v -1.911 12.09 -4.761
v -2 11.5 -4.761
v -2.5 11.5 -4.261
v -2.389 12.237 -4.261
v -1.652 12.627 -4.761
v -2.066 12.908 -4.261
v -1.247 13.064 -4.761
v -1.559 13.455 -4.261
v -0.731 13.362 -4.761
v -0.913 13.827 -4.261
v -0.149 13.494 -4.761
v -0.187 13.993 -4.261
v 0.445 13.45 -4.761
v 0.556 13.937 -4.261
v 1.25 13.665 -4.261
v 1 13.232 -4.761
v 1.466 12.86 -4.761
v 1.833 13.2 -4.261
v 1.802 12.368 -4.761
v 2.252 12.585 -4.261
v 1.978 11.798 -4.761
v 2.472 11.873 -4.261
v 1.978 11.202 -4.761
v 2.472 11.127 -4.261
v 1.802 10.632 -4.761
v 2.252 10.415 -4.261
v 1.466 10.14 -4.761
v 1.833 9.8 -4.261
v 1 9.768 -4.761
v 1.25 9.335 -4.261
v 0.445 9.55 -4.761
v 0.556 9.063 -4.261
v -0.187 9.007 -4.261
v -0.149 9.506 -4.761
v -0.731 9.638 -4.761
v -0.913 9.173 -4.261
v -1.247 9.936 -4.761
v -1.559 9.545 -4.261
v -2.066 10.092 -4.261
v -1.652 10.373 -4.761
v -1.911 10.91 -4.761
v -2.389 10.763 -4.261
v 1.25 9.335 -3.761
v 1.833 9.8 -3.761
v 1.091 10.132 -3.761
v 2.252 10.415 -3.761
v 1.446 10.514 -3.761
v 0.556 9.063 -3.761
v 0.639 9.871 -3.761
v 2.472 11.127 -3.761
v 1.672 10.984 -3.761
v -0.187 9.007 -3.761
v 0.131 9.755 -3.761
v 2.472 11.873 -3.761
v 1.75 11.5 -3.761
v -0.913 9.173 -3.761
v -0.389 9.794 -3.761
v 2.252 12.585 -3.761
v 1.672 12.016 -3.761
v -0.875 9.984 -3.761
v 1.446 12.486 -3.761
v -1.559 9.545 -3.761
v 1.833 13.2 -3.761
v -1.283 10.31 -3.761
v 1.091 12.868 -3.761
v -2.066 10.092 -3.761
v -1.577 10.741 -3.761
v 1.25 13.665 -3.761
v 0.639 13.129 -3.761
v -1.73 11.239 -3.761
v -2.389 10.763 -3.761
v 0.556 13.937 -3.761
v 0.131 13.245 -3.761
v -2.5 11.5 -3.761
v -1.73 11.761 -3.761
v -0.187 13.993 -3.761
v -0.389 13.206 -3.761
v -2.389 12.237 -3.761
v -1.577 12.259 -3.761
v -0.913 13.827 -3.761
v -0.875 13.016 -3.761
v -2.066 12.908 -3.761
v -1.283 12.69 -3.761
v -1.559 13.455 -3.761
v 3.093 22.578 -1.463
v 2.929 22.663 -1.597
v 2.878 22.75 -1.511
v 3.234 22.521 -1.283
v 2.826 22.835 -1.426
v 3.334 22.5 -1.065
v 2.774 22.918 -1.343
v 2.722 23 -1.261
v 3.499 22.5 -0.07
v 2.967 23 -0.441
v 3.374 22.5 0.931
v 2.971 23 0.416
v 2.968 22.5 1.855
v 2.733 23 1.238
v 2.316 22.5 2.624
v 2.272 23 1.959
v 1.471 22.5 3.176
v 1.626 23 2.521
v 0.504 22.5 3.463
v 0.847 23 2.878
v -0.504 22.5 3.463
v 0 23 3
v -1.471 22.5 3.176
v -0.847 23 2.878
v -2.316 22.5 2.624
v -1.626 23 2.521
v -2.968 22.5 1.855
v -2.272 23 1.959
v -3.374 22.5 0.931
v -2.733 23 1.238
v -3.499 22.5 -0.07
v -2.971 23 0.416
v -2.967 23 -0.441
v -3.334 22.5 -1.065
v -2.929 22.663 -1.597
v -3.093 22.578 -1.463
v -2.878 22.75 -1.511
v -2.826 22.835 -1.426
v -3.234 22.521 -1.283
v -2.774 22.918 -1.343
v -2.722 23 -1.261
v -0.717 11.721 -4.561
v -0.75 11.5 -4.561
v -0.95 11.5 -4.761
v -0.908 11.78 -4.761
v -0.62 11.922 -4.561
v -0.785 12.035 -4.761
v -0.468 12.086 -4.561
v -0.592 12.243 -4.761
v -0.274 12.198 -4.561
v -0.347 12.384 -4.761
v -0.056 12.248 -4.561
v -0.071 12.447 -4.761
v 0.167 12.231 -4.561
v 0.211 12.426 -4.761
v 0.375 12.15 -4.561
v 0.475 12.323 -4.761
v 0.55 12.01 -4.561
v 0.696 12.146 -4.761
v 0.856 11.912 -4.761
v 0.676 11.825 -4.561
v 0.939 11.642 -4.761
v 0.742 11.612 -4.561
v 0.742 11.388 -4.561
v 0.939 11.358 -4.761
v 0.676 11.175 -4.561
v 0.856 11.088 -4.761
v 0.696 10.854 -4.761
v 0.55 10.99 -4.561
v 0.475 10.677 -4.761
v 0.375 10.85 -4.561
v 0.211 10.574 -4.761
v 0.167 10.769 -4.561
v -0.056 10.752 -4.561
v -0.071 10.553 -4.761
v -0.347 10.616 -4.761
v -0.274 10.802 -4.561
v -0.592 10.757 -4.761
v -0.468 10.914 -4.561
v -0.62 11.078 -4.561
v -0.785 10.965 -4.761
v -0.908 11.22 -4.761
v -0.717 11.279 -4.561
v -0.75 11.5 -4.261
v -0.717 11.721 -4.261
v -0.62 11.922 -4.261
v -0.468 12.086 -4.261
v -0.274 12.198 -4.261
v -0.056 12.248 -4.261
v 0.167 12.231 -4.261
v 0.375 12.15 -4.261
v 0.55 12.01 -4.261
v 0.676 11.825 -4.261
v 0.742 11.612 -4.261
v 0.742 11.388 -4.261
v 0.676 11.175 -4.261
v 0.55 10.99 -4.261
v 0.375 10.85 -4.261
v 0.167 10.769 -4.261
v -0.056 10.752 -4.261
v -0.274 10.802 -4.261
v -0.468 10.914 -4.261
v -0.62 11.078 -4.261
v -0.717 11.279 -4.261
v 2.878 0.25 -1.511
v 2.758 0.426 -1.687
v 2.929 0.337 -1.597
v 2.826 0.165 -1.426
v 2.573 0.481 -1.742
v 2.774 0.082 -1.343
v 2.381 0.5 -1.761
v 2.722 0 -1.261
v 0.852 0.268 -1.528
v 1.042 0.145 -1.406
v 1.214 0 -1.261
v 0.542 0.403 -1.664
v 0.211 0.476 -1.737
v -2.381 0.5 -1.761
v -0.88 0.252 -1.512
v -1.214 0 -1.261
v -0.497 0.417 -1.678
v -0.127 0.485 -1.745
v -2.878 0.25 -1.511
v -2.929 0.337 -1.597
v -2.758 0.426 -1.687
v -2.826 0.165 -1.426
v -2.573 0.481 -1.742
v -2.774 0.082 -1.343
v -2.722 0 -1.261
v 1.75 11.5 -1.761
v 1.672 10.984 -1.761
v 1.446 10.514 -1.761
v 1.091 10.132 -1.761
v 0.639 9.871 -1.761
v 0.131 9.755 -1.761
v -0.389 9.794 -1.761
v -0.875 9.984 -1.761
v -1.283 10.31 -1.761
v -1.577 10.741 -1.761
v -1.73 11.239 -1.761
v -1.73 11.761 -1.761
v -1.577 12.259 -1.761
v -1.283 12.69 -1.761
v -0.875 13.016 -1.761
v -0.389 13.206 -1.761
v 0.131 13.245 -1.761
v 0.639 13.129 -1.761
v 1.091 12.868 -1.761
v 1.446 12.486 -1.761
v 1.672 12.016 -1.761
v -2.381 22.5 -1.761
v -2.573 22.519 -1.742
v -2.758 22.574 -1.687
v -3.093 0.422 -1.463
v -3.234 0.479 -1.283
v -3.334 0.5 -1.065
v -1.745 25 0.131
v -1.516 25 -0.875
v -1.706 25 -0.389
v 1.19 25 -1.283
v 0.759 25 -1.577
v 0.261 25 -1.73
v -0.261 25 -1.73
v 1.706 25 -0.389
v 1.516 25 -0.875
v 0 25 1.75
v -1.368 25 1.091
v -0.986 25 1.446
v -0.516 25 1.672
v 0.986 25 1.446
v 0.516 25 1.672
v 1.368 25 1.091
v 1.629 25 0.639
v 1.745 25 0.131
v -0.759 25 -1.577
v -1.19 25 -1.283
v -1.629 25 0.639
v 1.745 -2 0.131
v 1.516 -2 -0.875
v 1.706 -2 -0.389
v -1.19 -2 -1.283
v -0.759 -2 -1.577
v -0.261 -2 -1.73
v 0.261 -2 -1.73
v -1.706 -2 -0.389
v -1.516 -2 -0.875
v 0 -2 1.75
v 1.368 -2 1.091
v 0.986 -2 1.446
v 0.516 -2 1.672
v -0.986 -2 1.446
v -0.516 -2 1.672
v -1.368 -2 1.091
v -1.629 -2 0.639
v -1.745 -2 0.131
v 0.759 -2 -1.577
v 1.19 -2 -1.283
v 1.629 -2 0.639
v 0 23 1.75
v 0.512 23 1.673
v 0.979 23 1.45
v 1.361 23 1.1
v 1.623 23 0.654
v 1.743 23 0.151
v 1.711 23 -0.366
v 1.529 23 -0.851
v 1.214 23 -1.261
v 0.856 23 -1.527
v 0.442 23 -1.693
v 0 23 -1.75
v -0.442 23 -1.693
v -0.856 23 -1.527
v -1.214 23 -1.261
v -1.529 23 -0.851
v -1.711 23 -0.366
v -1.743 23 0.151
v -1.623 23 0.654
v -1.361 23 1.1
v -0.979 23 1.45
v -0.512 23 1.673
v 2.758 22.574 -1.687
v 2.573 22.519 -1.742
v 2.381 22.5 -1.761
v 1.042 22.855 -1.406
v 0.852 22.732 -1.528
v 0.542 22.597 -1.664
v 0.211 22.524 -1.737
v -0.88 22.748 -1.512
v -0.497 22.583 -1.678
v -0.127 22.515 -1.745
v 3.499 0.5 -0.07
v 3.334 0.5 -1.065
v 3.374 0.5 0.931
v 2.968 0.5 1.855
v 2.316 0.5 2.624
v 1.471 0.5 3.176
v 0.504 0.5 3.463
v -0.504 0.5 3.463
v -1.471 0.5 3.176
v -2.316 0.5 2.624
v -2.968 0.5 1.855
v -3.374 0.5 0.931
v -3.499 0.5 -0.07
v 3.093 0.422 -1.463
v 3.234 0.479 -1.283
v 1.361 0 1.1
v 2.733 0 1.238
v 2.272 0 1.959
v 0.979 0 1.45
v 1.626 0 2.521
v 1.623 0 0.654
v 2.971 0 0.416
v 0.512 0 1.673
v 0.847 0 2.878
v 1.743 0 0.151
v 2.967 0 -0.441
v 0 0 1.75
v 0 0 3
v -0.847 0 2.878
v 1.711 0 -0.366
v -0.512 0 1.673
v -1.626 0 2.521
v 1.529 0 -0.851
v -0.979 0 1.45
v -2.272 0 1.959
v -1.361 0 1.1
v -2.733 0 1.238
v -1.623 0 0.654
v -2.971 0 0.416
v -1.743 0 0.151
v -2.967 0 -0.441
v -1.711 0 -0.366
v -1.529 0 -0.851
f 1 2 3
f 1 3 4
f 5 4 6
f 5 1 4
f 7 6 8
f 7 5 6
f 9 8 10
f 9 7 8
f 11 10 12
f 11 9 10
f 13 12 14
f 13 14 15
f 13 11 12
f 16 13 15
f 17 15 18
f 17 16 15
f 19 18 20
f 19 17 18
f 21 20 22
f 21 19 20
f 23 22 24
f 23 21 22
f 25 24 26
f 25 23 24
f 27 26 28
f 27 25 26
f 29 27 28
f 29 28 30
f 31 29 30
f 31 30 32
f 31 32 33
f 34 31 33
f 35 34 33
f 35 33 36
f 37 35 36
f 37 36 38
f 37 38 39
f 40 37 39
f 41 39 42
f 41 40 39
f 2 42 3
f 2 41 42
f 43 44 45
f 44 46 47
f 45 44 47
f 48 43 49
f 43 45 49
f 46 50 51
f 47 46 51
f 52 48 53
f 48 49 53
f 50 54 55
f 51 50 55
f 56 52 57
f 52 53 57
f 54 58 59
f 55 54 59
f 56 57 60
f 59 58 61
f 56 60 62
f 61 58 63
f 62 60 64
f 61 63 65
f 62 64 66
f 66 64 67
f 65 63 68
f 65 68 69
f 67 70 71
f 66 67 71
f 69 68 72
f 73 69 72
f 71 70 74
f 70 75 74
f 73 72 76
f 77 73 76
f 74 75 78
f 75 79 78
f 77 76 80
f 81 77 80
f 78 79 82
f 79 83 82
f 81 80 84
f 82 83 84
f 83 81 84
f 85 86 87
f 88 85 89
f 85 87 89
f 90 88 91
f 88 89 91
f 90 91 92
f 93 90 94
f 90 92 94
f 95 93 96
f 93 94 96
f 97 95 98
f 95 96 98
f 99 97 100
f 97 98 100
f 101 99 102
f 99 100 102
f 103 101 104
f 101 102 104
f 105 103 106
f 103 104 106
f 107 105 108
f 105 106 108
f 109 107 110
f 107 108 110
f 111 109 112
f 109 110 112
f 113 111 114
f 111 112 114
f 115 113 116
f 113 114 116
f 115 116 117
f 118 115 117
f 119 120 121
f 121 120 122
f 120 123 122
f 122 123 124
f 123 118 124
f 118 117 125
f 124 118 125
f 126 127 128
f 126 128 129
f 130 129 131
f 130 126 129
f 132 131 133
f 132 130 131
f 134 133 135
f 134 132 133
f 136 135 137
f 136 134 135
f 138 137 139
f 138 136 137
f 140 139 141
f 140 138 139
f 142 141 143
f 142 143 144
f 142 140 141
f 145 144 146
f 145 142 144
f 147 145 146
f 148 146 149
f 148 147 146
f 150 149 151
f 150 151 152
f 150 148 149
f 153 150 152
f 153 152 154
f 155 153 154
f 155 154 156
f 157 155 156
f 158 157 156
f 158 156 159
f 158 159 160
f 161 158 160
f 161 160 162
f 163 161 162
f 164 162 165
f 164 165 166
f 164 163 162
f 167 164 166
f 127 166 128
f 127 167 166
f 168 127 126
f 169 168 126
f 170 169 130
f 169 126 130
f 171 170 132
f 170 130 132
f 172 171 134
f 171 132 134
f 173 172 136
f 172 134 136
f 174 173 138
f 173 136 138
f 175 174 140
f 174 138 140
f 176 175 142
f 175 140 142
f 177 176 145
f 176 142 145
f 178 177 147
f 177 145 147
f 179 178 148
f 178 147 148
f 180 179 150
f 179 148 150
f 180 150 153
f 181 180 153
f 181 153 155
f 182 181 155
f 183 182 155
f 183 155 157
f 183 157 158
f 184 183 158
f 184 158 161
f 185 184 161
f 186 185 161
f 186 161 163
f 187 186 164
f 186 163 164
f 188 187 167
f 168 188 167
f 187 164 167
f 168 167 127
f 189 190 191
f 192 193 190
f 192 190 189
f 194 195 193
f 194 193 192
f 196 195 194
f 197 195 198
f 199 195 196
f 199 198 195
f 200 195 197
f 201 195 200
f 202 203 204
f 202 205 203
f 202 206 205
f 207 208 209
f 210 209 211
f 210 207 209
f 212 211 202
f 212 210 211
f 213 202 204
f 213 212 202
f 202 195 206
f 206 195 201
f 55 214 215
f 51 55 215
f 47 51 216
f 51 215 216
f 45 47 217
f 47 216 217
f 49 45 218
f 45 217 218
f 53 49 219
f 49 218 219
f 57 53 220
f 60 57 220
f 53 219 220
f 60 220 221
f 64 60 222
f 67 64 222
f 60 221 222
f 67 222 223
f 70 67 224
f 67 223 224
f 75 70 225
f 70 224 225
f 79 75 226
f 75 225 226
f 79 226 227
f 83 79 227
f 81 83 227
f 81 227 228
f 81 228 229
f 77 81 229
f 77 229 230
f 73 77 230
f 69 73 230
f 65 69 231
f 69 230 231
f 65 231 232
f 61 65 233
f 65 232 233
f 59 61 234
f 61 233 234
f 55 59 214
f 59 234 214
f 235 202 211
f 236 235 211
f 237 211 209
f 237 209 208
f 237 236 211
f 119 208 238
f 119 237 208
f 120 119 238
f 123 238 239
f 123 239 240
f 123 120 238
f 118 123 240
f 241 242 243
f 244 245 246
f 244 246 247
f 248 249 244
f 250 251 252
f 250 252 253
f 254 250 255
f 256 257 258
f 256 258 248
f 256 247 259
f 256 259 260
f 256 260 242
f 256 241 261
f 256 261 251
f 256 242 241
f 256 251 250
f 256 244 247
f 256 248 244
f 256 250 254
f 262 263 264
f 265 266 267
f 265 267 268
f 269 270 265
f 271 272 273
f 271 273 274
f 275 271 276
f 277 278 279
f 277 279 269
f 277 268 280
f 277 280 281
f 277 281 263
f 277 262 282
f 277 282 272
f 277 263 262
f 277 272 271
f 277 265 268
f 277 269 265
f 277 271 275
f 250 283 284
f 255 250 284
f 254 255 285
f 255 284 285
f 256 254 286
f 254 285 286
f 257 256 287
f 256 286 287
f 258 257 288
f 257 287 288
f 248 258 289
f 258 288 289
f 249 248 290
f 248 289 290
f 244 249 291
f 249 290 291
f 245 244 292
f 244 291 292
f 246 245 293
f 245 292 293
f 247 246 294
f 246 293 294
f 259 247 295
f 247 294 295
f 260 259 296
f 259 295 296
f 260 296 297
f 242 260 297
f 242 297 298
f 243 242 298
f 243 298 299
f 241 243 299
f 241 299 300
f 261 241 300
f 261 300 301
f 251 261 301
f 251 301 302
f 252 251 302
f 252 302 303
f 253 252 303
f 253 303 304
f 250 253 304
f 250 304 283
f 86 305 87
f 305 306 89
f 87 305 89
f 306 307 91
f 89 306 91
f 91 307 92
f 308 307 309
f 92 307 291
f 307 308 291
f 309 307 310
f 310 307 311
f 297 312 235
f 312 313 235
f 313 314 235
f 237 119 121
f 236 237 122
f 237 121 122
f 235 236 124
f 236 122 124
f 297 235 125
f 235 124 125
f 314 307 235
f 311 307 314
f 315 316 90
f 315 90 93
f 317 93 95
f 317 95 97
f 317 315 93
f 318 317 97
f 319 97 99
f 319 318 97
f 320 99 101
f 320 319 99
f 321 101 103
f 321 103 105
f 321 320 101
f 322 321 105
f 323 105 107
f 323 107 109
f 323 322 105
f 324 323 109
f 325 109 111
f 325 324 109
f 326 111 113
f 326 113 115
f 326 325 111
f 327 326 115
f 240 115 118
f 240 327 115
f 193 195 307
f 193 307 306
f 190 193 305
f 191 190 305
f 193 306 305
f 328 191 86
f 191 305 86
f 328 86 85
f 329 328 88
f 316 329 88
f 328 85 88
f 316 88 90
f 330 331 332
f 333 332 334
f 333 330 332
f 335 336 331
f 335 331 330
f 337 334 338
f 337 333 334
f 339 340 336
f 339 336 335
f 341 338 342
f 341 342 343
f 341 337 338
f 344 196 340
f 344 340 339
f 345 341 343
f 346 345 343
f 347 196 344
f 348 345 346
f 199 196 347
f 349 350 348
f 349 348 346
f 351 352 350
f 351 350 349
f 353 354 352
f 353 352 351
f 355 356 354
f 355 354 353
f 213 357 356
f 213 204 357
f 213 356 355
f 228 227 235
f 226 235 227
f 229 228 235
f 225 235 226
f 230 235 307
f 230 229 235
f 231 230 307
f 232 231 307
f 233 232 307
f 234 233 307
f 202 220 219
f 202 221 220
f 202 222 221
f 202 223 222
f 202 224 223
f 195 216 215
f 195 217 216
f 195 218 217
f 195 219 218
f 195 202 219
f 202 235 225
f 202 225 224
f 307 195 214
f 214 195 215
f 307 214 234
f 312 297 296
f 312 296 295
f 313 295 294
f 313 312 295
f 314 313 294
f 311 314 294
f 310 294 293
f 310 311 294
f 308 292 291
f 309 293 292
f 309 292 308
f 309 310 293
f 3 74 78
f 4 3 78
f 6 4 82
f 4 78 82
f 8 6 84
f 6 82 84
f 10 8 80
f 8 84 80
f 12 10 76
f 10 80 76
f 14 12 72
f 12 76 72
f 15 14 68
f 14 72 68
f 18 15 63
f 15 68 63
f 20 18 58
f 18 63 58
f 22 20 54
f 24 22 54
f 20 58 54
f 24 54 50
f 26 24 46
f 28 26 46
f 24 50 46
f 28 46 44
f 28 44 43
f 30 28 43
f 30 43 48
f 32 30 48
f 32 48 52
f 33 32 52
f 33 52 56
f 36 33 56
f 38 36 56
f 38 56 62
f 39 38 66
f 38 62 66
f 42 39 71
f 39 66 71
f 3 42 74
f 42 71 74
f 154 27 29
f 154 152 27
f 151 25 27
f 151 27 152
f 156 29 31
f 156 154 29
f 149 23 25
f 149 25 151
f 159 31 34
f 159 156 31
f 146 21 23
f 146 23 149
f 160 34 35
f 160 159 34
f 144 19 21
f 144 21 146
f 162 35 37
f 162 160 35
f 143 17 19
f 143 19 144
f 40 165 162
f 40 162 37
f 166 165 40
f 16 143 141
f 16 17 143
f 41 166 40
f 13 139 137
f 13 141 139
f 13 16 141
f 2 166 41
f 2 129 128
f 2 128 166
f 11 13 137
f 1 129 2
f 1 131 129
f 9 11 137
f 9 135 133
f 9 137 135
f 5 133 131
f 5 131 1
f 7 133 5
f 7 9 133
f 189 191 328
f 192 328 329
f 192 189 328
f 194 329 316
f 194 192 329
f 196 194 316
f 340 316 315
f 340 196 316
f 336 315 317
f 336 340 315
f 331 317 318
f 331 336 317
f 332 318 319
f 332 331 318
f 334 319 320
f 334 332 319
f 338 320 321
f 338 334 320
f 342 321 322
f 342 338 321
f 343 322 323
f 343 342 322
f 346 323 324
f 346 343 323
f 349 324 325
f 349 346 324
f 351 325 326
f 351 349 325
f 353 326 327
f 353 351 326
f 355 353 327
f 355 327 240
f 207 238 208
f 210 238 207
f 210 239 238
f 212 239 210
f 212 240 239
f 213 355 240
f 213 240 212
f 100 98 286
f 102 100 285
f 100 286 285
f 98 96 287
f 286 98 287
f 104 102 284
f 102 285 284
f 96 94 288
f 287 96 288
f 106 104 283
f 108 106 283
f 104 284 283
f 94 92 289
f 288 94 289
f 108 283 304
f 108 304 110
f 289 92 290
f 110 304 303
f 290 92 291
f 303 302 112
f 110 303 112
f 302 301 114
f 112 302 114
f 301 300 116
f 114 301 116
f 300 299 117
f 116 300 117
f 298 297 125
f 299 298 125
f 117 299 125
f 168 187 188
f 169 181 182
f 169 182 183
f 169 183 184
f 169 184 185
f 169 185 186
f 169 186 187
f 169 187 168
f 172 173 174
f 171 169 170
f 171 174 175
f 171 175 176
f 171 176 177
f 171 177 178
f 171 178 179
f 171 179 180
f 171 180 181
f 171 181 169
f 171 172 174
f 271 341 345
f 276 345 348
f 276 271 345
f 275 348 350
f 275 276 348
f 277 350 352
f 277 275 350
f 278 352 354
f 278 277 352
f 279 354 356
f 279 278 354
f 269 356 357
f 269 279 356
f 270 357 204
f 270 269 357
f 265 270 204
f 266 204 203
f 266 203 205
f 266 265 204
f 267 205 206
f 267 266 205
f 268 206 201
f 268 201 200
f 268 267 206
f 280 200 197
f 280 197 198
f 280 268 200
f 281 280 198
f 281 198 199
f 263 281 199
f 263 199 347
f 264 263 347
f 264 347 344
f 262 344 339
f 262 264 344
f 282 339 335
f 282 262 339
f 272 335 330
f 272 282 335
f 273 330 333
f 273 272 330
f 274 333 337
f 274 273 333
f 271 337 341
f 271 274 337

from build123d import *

# Parameters (mm, degrees)
EXTRUDE_1_DEPTH     = 23
SKETCH_2_R          = 1.75
EXTRUDE_2_DEPTH     = 2
EXTRUDE_START       = 2
SKETCH_3_R          = 1.75
EXTRUDE_3_DEPTH     = 2
SKETCH_4_R          = 1.75
EXTRUDE_4_DEPTH     = 2
SKETCH_5_R          = 2.5
EXTRUDE_5_DEPTH     = 1
CHAMFER_1_SIZE      = 0.5
SKETCH_6_R          = 0.75
CUT_EXTRUDE_1_DEPTH = 0.5
CHAMFER_2_SIZE      = 0.2
CHAMFER_3_SIZE      = 0.5
FILLET_3_R          = 1


with BuildPart() as part:
    # 草图1 → 凸台-拉伸1 (new body)
    with BuildSketch(Plane(origin=(0, 0, 0), x_dir=(1, 0, 0), z_dir=(0, 1, 0))):
        with BuildLine():
            Line((-3.024810761, 1.76082931), (3.024810761, 1.76082931))
            ThreePointArc((3.024810761, 1.76082931), (0, -3.5), (-3.024810761, 1.76082931))
        make_face()
    extrude(amount=EXTRUDE_1_DEPTH)

    # 草图2 → 凸台-拉伸2 (add)
    with BuildSketch(Plane(origin=(0, 23, 0), x_dir=(1, 0, 0), z_dir=(0, 1, 0))):
        with Locations(Location((0, 0, 0), (0, 0, 270))):
            Circle(SKETCH_2_R)
    extrude(amount=EXTRUDE_2_DEPTH)

    # 草图3 → 凸台-拉伸3 (add)
    with BuildSketch(Plane.XZ.offset(EXTRUDE_START)):
        with Locations(Location((0, 0, 0), (0, 0, 90))):
            Circle(SKETCH_3_R)
    extrude(amount=-EXTRUDE_3_DEPTH)

    # 草图4 → 凸台-拉伸4 (add)
    with BuildSketch(Plane(origin=(0, 0, -1.76082931), x_dir=(-1, 0, 0), z_dir=(0, 0, -1))):
        with Locations(Location((0, 11.5, 0), (0, 0, 180))):
            Circle(SKETCH_4_R)
    extrude(amount=EXTRUDE_4_DEPTH)

    # 草图5 → 凸台-拉伸5 (add)
    with BuildSketch(Plane(origin=(0, 0, -3.76082931), x_dir=(-1, 0, 0), z_dir=(0, 0, -1))):
        with Locations((0, 11.5)):
            Circle(SKETCH_5_R)
    extrude(amount=EXTRUDE_5_DEPTH)

    # 倒角1
    chamfer_1_edges = [part.edges().sort_by_distance(p)[0] for p in [
        (2.5, 11.5, -4.76082931),
    ]]
    chamfer(chamfer_1_edges, length=CHAMFER_1_SIZE)

    # 草图6 → 切除-拉伸1 (cut)
    with BuildSketch(Plane(origin=(0, 0, -4.76082931), x_dir=(-1, 0, 0), z_dir=(0, 0, -1))):
        with Locations((0, 11.5)):
            Circle(SKETCH_6_R)
    extrude(amount=-CUT_EXTRUDE_1_DEPTH, mode=Mode.SUBTRACT)

    # 倒角2
    chamfer_2_edges = [part.edges().sort_by_distance(p)[0] for p in [
        (0.75, 11.5, -4.76082931),
    ]]
    chamfer(chamfer_2_edges, length=CHAMFER_2_SIZE)

    # 倒角3
    # the kernel refuses this chamfer: 0.5 mm, written as the material it takes off along each edge
    with BuildSketch(Plane(origin=(-4.310652255, 0, -1.76082931), x_dir=(0, 0.9996219169112968, -0.027495876610586494), z_dir=(1, 0, 0))) as chamfer_3_piece_1_section:
        Polygon((CHAMFER_3_SIZE * 0.999621916911, CHAMFER_3_SIZE * 0.0274958766106), (-CHAMFER_3_SIZE * 0.0274958766106, CHAMFER_3_SIZE * 0.999621916911), (0, 0), align=None)
    chamfer_3_piece_1 = extrude(amount=8.62130451, mode=Mode.PRIVATE)
    chamfer_3_piece_1 = chamfer_3_piece_1 - Plane(origin=(0, 0.410648891, 0), x_dir=(0, 0, 1), z_dir=(0, -1, 0)) * Cylinder(1.75, 20, mode=Mode.PRIVATE)
    add(chamfer_3_piece_1, mode=Mode.SUBTRACT)
    with BuildSketch(Plane(origin=(0, 0, 0), x_dir=(0.625040137107155, 0, -0.7805926127020859), z_dir=(-0.7805926127020859, 0, -0.625040137107155))) as chamfer_3_piece_2:
        Polygon((3.5, -CHAMFER_3_SIZE), (3.5 - CHAMFER_3_SIZE, 0), (3.5, 0), align=None)
    revolve(axis=Axis((0, 0, 0), (0, -1, 0)), revolution_arc=282.629733058, mode=Mode.SUBTRACT)
    with BuildSketch(Plane(origin=(0, 23, 0), x_dir=(0.6250401371071543, 0, -0.7805926127020866), z_dir=(-0.7805926127020866, 0, -0.6250401371071543))) as chamfer_3_piece_3:
        Polygon((3.5, CHAMFER_3_SIZE), (3.5 - CHAMFER_3_SIZE, 0), (3.5, 0), align=None)
    revolve(axis=Axis((0, 23, 0), (0, -1, 0)), revolution_arc=282.629733058, mode=Mode.SUBTRACT)
    with BuildSketch(Plane(origin=(-4.310652255, 23, -1.76082931), x_dir=(0, -0.9996219169112968, -0.027495876610586414), z_dir=(1, 0, 0))) as chamfer_3_piece_4_section:
        Polygon((CHAMFER_3_SIZE * 0.999621916911, -CHAMFER_3_SIZE * 0.0274958766106), (-CHAMFER_3_SIZE * 0.0274958766106, -CHAMFER_3_SIZE * 0.999621916911), (0, 0), align=None)
    chamfer_3_piece_4 = extrude(amount=8.62130451, mode=Mode.PRIVATE)
    chamfer_3_piece_4 = chamfer_3_piece_4 - Plane(origin=(0, 22.589351109, 0), x_dir=(0, 0, 1), z_dir=(0, -1, 0)) * Cylinder(1.75, 20, mode=Mode.PRIVATE)
    add(chamfer_3_piece_4, mode=Mode.SUBTRACT)

    # 圆角3
    fillet_3_edges = [part.edges().sort_by_distance(p)[0] for p in [
        (3.024810761, 11.5, -1.76082931),
        (-3.024810761, 11.5, -1.76082931),
    ]]
    fillet(fillet_3_edges, radius=FILLET_3_R)


solid = part.part
